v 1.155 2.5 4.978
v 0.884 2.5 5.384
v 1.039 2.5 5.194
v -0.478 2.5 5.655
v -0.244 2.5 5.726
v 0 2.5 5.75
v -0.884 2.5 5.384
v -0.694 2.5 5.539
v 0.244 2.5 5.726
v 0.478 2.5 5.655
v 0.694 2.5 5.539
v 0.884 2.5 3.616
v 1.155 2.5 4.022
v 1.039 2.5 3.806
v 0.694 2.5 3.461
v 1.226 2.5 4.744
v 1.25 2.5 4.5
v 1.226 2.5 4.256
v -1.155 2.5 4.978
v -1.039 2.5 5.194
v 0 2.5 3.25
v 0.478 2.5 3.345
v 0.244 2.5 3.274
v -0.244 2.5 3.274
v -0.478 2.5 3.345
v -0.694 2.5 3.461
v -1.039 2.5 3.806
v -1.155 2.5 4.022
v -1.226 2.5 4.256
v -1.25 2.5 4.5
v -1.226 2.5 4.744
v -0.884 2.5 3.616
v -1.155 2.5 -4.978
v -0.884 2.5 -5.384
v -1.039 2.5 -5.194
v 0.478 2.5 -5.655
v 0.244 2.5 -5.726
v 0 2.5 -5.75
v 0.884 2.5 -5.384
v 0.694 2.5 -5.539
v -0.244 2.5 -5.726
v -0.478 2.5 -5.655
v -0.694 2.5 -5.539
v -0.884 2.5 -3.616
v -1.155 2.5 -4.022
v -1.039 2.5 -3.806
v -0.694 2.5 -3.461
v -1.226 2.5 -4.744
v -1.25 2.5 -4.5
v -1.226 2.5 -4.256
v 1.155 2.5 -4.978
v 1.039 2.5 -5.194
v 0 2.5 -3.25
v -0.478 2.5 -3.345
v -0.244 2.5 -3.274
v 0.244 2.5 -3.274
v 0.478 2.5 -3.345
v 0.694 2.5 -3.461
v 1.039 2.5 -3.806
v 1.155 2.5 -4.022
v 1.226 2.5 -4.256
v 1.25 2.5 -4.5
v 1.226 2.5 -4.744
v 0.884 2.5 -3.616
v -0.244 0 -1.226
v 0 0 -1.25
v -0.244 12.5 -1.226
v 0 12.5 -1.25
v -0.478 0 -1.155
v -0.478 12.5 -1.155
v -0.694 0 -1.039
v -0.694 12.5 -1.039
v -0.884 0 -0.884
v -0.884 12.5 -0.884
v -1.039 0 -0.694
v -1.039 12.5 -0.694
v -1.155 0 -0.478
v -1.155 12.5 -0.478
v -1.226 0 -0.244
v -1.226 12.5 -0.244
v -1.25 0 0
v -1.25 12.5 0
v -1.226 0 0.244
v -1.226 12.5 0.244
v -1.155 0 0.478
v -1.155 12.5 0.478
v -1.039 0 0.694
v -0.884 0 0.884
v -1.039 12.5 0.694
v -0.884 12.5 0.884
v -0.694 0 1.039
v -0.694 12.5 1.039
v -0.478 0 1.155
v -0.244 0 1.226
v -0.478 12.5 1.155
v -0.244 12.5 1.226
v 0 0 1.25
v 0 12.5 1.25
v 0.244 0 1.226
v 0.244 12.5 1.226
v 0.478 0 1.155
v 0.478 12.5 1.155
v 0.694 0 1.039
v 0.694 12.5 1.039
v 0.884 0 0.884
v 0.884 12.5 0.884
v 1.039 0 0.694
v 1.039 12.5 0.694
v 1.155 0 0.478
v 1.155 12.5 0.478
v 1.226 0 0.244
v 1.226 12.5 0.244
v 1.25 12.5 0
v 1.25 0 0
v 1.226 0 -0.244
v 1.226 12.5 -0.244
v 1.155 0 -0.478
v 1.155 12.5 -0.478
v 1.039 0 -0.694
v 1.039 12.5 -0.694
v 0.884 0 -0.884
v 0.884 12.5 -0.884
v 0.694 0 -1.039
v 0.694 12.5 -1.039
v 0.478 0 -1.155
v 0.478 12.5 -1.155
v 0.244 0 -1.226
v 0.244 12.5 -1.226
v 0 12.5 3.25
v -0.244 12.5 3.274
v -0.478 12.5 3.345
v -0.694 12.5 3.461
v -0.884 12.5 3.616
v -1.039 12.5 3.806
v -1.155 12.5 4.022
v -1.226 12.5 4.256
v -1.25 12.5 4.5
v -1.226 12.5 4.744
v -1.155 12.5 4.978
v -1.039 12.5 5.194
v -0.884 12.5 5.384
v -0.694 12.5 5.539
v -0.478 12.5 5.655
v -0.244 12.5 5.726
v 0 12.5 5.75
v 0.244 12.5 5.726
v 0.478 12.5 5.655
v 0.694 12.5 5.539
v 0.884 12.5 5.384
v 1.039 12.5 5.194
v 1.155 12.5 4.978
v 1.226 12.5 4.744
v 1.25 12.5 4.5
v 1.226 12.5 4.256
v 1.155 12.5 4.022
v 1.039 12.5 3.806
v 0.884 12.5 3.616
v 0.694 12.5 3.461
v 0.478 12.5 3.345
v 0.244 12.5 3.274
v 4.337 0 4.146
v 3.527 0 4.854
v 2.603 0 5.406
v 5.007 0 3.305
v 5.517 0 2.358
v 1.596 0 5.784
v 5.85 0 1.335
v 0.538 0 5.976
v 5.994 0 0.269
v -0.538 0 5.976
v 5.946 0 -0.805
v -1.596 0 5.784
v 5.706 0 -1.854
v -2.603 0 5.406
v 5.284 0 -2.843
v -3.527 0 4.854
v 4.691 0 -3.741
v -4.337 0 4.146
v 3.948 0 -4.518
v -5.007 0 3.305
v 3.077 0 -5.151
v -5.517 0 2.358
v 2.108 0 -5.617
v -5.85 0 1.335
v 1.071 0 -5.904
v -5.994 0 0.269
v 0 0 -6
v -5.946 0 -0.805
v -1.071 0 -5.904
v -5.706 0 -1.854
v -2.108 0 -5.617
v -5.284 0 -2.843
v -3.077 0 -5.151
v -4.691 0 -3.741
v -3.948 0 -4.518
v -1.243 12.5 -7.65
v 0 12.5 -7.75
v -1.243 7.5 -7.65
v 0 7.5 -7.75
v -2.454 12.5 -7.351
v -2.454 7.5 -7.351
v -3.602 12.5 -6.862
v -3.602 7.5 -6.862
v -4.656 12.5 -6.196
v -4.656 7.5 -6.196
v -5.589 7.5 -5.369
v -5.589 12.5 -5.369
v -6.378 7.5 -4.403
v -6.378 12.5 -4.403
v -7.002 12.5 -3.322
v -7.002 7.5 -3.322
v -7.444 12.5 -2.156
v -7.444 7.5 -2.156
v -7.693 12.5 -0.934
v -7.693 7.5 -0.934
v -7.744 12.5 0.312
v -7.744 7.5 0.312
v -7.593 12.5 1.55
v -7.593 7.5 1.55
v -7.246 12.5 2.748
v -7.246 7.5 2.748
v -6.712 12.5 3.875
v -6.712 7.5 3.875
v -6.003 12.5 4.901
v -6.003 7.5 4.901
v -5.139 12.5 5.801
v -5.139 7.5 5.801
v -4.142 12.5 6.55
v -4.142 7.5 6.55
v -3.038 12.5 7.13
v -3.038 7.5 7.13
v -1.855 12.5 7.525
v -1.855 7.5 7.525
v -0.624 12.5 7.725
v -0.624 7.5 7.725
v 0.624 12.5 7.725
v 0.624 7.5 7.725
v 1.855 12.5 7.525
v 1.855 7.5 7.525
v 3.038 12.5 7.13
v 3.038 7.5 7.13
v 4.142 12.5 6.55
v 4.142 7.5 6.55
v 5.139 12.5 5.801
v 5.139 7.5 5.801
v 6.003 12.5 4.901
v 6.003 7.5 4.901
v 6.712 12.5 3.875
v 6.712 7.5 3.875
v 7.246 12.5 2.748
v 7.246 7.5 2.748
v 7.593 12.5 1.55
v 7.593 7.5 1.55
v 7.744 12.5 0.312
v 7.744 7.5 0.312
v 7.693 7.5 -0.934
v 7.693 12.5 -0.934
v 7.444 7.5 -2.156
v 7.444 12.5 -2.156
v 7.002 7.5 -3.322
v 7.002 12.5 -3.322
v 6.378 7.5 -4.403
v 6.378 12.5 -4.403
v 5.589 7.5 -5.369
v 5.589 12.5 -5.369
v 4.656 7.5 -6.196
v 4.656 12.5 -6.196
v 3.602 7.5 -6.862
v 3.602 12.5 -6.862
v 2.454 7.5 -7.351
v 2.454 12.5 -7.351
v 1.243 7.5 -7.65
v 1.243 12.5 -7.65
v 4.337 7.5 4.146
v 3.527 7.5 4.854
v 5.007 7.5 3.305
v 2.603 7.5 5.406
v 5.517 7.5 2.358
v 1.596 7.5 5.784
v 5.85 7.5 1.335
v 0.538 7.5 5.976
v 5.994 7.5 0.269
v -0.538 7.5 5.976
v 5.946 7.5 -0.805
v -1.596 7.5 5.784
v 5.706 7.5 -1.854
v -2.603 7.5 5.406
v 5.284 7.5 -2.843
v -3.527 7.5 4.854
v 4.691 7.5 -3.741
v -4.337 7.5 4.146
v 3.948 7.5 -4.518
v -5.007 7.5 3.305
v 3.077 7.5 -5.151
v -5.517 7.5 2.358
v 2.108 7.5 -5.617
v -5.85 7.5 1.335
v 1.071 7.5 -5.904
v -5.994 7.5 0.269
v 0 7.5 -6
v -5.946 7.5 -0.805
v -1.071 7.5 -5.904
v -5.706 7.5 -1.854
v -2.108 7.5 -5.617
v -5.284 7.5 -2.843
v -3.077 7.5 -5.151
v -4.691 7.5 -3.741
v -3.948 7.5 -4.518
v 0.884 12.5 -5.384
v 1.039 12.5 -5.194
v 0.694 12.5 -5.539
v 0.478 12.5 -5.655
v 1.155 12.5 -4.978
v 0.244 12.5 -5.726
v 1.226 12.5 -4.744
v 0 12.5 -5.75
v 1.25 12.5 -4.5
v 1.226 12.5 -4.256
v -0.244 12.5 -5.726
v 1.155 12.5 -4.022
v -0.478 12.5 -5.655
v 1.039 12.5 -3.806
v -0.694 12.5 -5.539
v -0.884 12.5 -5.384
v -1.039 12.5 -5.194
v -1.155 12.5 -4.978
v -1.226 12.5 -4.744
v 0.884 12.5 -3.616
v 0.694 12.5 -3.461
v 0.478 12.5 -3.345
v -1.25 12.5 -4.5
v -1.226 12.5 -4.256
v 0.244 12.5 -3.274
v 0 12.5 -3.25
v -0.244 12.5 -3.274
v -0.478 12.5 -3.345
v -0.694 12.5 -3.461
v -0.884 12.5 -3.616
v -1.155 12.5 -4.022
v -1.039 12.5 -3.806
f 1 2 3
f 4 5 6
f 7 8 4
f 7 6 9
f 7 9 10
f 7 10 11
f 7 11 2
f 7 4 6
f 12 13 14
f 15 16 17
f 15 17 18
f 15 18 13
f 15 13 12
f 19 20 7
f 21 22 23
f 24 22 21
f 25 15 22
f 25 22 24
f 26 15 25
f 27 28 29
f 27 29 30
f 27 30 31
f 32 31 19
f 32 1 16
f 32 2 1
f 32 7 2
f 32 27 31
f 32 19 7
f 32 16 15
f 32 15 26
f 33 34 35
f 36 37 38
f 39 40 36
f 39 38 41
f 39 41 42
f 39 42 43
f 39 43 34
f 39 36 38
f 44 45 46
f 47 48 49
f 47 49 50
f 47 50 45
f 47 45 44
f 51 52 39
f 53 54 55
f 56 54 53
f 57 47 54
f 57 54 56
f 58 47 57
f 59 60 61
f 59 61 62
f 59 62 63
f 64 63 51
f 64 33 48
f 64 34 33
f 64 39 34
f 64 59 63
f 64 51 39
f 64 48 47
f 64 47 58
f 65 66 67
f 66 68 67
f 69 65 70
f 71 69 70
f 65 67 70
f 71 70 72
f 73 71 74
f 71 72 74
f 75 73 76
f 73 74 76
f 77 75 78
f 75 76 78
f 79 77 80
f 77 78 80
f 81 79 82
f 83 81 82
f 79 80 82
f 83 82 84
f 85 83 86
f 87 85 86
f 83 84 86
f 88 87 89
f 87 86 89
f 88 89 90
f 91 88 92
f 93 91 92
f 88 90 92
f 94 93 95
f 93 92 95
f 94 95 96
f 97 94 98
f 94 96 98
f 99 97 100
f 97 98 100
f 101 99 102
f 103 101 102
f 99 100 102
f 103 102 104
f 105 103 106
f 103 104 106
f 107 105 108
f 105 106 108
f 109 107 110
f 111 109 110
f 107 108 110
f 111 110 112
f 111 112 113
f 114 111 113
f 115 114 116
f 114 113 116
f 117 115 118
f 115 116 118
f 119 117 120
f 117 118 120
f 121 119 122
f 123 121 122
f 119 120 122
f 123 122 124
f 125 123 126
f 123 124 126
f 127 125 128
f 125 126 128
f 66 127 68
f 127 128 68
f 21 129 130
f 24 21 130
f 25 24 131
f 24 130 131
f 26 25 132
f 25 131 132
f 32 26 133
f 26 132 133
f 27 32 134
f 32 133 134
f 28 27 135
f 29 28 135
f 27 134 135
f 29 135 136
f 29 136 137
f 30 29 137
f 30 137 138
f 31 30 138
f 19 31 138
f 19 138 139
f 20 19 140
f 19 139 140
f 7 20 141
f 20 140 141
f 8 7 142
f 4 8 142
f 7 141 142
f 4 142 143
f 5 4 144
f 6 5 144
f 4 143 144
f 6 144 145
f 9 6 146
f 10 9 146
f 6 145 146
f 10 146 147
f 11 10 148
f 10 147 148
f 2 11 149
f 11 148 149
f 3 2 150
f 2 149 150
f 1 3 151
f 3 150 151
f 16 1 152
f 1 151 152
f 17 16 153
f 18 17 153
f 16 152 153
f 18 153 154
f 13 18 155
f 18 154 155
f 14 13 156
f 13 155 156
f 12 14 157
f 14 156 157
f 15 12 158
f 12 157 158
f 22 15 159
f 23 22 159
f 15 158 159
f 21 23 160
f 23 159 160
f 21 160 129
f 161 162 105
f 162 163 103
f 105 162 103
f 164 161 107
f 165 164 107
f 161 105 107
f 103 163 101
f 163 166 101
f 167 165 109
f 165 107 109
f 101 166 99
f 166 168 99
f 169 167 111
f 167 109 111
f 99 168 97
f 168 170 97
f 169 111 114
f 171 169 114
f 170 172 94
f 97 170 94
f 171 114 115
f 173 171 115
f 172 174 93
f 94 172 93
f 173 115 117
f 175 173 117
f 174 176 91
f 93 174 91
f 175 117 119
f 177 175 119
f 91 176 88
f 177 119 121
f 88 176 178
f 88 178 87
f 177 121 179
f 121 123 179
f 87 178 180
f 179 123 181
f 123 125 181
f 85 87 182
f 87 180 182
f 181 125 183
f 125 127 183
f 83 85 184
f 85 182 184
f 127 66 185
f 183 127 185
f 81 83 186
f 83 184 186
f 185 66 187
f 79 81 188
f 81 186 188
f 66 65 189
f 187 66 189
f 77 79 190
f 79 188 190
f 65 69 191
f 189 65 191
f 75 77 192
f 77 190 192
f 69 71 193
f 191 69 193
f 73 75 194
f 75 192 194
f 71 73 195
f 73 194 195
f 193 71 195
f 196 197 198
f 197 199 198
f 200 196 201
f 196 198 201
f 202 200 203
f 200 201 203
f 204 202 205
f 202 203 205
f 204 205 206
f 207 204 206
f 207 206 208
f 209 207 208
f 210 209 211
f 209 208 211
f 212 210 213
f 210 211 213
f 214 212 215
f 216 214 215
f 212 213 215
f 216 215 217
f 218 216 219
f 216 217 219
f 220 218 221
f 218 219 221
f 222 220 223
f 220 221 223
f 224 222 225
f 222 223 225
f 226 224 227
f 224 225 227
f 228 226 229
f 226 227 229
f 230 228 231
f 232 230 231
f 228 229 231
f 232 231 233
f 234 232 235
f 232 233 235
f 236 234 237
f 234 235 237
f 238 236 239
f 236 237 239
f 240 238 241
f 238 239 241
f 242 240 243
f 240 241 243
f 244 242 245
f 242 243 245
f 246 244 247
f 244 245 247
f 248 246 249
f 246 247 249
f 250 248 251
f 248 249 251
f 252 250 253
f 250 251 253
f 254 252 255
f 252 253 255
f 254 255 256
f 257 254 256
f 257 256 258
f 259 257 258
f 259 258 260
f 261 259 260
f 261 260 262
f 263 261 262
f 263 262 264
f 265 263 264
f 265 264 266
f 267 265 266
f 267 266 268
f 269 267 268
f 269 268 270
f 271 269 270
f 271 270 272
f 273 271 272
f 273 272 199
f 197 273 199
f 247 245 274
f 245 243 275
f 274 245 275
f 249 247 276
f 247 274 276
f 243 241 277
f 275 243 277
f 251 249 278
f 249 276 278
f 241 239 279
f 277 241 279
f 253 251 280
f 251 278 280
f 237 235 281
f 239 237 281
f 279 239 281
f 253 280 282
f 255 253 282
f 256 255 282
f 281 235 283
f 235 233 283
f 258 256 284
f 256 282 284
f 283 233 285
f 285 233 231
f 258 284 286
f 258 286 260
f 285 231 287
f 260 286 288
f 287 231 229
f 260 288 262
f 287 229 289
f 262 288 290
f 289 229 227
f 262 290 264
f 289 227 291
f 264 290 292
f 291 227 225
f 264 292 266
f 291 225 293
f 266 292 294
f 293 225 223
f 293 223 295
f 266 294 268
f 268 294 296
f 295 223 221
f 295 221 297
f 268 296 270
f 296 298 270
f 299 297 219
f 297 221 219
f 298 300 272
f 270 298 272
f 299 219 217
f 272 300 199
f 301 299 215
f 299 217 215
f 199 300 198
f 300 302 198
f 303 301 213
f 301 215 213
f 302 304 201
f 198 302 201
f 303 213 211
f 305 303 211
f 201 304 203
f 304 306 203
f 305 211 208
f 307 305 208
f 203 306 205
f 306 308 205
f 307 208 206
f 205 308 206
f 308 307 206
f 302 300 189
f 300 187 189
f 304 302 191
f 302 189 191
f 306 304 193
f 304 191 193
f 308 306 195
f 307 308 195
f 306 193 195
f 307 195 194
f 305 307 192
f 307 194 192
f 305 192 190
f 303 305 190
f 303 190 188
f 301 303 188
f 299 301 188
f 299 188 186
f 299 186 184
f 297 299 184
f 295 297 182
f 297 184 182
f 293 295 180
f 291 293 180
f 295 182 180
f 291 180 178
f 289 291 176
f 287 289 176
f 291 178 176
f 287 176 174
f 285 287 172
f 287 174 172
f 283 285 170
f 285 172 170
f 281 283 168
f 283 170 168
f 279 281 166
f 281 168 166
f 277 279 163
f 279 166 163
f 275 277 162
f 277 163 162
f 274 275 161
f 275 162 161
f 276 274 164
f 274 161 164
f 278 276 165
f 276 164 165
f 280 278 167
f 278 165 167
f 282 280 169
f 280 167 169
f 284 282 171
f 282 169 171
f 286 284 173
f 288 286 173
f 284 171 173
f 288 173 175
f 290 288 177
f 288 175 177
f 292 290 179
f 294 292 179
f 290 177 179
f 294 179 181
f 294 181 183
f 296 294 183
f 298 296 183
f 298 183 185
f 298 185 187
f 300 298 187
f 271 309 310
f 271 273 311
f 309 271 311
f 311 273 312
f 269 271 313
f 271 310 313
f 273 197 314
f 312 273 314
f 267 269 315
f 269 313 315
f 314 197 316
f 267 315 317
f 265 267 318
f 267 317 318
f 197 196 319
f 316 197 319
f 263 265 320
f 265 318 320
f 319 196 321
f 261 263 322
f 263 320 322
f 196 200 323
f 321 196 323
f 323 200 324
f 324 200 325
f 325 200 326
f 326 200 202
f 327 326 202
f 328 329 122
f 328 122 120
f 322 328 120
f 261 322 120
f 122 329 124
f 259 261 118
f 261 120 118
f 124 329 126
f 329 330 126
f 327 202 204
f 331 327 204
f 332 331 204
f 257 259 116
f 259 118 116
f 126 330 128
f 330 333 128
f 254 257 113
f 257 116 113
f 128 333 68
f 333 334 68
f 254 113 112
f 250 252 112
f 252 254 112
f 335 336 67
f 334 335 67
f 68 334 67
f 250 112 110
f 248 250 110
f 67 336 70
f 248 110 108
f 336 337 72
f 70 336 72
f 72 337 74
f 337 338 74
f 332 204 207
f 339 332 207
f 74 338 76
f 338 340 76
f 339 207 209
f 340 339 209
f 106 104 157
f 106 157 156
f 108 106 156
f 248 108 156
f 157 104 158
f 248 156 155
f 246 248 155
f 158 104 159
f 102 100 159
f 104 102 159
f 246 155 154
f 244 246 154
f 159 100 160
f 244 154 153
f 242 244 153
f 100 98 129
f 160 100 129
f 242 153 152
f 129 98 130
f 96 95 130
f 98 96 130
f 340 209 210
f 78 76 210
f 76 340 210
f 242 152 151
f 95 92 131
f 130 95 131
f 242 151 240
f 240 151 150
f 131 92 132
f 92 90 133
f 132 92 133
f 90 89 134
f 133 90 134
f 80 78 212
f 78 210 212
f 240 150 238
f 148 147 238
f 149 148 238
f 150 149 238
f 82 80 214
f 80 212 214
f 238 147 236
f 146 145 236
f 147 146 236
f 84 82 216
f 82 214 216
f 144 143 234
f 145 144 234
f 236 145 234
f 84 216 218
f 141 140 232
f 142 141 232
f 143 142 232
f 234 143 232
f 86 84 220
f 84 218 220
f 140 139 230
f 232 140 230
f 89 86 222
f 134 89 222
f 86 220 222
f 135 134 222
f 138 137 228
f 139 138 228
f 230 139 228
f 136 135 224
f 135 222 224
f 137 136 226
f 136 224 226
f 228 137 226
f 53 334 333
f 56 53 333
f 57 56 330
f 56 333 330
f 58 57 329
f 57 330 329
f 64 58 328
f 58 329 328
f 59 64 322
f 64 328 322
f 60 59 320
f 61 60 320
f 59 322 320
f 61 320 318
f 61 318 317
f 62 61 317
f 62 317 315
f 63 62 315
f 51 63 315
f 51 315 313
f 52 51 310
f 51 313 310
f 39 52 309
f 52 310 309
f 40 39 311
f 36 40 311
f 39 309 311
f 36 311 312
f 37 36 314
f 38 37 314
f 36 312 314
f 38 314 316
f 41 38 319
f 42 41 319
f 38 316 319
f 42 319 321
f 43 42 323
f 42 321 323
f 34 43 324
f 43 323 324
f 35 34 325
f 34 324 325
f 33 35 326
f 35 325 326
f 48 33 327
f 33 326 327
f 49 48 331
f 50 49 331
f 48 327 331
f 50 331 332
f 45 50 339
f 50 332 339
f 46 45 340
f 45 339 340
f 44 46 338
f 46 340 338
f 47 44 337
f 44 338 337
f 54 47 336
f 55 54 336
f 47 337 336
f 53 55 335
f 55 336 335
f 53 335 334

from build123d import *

# Parameters (mm, degrees)
ESQUISSE2_R             = 1.25
ENL_V_MAT_EXTRU_1_DEPTH = 10


with BuildPart() as part:
    # Esquisse1 → Révolution1 (revolve)
    with BuildSketch(Plane.XY, mode=Mode.PRIVATE) as r_volution1_sk:
        Polygon((7.75, 12.5), (7.75, 7.5), (6, 7.5), (6, 0), (1.25, 0), (1.25, 12.5), align=None)
    revolve(r_volution1_sk.sketch.rotate(Axis((0, 0, 0), (0, 1, 0)), 90), axis=Axis((0, 0, 0), (0, 1, 0)))

    # Esquisse2 → Enlèv. mat.-Extru.1 (cut)
    with BuildSketch(Plane(origin=(0, 12.5, 0), x_dir=(1, 0, 0), z_dir=(0, 1, 0))):
        with Locations(Location((0, 4.5, 0), (0, 0, 270))):
            Circle(ESQUISSE2_R)
        with Locations(Location((0, -4.5, 0), (0, 0, 90))):
            Circle(ESQUISSE2_R)
    extrude(amount=-ENL_V_MAT_EXTRU_1_DEPTH, mode=Mode.SUBTRACT)


solid = part.part
